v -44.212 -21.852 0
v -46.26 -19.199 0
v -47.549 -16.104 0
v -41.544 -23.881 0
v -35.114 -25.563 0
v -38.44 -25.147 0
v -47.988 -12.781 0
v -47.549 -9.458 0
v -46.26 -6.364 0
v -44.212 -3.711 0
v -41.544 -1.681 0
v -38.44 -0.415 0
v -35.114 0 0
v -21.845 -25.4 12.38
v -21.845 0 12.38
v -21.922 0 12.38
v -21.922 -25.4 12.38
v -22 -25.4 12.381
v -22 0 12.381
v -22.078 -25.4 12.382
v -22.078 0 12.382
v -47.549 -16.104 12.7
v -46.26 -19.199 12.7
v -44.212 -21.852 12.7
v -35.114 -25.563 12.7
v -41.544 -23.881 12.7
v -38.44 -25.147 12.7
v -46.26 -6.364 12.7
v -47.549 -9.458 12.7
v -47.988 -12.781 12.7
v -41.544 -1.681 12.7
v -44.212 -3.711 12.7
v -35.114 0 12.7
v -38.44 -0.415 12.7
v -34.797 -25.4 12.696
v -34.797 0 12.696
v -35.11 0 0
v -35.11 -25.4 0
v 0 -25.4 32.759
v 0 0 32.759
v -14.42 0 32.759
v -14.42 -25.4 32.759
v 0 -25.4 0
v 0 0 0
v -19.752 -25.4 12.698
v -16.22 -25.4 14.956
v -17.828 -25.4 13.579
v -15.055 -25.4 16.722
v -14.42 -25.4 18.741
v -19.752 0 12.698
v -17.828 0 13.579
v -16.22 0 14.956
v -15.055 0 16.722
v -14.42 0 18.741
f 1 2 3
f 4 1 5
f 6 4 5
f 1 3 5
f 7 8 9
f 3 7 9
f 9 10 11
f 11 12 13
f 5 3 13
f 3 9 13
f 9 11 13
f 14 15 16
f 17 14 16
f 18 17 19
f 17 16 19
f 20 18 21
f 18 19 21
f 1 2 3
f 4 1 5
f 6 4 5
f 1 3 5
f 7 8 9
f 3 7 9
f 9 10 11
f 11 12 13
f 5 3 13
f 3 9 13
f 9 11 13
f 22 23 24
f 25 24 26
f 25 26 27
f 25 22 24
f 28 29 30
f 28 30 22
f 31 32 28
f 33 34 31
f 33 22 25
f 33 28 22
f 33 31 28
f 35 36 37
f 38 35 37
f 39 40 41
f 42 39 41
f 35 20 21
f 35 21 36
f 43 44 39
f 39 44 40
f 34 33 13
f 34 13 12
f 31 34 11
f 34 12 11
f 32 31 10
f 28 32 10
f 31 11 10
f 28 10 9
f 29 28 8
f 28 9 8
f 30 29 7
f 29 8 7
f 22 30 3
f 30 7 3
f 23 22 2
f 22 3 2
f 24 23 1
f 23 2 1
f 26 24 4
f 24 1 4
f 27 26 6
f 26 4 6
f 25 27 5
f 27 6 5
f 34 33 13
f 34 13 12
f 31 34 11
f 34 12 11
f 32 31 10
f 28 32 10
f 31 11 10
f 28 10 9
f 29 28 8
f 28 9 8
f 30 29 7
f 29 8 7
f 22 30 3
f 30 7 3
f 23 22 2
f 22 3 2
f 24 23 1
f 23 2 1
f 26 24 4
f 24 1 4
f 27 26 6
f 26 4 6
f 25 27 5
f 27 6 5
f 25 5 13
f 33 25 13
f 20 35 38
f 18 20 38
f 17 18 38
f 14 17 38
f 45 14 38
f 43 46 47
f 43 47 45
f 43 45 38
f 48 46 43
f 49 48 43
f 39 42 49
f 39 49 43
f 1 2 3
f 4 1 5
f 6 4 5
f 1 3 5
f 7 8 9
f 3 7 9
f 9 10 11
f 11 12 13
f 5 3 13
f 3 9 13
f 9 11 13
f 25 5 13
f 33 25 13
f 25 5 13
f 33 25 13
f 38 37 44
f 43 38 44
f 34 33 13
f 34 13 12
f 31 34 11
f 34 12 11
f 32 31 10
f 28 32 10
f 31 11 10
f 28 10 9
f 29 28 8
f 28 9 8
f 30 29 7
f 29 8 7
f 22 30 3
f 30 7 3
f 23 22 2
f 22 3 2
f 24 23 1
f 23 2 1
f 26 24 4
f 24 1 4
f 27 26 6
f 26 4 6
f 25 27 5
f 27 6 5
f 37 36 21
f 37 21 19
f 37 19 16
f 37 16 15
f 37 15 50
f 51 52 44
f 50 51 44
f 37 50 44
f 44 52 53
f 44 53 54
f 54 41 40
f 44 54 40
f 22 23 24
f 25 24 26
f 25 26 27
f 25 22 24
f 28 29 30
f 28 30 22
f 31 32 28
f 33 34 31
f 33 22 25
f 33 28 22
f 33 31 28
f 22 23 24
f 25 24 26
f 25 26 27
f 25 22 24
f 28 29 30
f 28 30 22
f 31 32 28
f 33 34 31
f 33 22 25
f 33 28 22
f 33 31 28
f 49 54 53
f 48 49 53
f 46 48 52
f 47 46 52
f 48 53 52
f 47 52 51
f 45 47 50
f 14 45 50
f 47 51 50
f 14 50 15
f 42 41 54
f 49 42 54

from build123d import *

# Parameters (mm, degrees)
F3_DEPTH = 25.4
F5_DEPTH = 12.7
F6_DEPTH = 12.7
F7_DEPTH = 12.7


with BuildPart() as f3:
    # F2 (on Front) → F3 (new body)
    with BuildSketch(Plane.XZ):
        with BuildLine():
            Line((-34.796807, 12.69613), (-35.110293, 0))
            Line((-35.110293, 0), (0, 0))
            Line((0, 0), (0, 32.759152))
            Line((0, 32.759152), (-14.420303, 32.759152))
            Line((-14.420303, 32.759152), (-14.420303, 21.238586))
            ThreePointArc((-14.420303, 21.238586), (-14.31718, 19.990023), (-14.420303, 18.74146))
            Line((-14.420303, 18.74146), (-14.420303, 12.461014))
            Line((-14.420303, 12.461014), (-21.844627, 12.380474))
            ThreePointArc((-21.844627, 12.380474), (-21.961429, 12.380244), (-22.078218, 12.38209))
            Line((-22.078218, 12.38209), (-34.796807, 12.69613))
        make_face()
        with BuildLine():
            ThreePointArc((-14.420303, 18.74146), (-16.975877, 14.211037), (-21.844627, 12.380474))
            Line((-21.844627, 12.380474), (-14.420303, 12.461014))
            Line((-14.420303, 12.461014), (-14.420303, 18.74146))
        make_face()
        with BuildLine():
            ThreePointArc((-14.420303, 18.74146), (-14.31718, 19.990023), (-14.420303, 21.238586))
            Line((-14.420303, 21.238586), (-14.420303, 18.74146))
        make_face()
    extrude(amount=F3_DEPTH)


with BuildPart() as f5:
    # F4 (on Top) → F5 (new body)
    with BuildSketch(Plane.XY):
        with BuildLine():
            Line((-35.113923, -25.56259), (-35.113923, 0))
            ThreePointArc((-35.113923, 0), (-47.988266, -12.781295), (-35.113923, -25.56259))
        make_face()
    extrude(amount=F5_DEPTH)


with BuildPart() as f6:
    # F4 (on Top) → F6 (new body)
    with BuildSketch(Plane.XY):
        with BuildLine():
            Line((-35.113923, -25.56259), (-35.113923, 0))
            ThreePointArc((-35.113923, 0), (-47.988266, -12.781295), (-35.113923, -25.56259))
        make_face()
    extrude(amount=F6_DEPTH)


with BuildPart() as f7:
    # F4 (on Top) → F7 (new body)
    with BuildSketch(Plane.XY):
        with BuildLine():
            Line((-35.113923, -25.56259), (-35.113923, 0))
            ThreePointArc((-35.113923, 0), (-47.988266, -12.781295), (-35.113923, -25.56259))
        make_face()
    extrude(amount=F7_DEPTH)


solid = Compound([f3.part, f5.part, f6.part, f7.part])
